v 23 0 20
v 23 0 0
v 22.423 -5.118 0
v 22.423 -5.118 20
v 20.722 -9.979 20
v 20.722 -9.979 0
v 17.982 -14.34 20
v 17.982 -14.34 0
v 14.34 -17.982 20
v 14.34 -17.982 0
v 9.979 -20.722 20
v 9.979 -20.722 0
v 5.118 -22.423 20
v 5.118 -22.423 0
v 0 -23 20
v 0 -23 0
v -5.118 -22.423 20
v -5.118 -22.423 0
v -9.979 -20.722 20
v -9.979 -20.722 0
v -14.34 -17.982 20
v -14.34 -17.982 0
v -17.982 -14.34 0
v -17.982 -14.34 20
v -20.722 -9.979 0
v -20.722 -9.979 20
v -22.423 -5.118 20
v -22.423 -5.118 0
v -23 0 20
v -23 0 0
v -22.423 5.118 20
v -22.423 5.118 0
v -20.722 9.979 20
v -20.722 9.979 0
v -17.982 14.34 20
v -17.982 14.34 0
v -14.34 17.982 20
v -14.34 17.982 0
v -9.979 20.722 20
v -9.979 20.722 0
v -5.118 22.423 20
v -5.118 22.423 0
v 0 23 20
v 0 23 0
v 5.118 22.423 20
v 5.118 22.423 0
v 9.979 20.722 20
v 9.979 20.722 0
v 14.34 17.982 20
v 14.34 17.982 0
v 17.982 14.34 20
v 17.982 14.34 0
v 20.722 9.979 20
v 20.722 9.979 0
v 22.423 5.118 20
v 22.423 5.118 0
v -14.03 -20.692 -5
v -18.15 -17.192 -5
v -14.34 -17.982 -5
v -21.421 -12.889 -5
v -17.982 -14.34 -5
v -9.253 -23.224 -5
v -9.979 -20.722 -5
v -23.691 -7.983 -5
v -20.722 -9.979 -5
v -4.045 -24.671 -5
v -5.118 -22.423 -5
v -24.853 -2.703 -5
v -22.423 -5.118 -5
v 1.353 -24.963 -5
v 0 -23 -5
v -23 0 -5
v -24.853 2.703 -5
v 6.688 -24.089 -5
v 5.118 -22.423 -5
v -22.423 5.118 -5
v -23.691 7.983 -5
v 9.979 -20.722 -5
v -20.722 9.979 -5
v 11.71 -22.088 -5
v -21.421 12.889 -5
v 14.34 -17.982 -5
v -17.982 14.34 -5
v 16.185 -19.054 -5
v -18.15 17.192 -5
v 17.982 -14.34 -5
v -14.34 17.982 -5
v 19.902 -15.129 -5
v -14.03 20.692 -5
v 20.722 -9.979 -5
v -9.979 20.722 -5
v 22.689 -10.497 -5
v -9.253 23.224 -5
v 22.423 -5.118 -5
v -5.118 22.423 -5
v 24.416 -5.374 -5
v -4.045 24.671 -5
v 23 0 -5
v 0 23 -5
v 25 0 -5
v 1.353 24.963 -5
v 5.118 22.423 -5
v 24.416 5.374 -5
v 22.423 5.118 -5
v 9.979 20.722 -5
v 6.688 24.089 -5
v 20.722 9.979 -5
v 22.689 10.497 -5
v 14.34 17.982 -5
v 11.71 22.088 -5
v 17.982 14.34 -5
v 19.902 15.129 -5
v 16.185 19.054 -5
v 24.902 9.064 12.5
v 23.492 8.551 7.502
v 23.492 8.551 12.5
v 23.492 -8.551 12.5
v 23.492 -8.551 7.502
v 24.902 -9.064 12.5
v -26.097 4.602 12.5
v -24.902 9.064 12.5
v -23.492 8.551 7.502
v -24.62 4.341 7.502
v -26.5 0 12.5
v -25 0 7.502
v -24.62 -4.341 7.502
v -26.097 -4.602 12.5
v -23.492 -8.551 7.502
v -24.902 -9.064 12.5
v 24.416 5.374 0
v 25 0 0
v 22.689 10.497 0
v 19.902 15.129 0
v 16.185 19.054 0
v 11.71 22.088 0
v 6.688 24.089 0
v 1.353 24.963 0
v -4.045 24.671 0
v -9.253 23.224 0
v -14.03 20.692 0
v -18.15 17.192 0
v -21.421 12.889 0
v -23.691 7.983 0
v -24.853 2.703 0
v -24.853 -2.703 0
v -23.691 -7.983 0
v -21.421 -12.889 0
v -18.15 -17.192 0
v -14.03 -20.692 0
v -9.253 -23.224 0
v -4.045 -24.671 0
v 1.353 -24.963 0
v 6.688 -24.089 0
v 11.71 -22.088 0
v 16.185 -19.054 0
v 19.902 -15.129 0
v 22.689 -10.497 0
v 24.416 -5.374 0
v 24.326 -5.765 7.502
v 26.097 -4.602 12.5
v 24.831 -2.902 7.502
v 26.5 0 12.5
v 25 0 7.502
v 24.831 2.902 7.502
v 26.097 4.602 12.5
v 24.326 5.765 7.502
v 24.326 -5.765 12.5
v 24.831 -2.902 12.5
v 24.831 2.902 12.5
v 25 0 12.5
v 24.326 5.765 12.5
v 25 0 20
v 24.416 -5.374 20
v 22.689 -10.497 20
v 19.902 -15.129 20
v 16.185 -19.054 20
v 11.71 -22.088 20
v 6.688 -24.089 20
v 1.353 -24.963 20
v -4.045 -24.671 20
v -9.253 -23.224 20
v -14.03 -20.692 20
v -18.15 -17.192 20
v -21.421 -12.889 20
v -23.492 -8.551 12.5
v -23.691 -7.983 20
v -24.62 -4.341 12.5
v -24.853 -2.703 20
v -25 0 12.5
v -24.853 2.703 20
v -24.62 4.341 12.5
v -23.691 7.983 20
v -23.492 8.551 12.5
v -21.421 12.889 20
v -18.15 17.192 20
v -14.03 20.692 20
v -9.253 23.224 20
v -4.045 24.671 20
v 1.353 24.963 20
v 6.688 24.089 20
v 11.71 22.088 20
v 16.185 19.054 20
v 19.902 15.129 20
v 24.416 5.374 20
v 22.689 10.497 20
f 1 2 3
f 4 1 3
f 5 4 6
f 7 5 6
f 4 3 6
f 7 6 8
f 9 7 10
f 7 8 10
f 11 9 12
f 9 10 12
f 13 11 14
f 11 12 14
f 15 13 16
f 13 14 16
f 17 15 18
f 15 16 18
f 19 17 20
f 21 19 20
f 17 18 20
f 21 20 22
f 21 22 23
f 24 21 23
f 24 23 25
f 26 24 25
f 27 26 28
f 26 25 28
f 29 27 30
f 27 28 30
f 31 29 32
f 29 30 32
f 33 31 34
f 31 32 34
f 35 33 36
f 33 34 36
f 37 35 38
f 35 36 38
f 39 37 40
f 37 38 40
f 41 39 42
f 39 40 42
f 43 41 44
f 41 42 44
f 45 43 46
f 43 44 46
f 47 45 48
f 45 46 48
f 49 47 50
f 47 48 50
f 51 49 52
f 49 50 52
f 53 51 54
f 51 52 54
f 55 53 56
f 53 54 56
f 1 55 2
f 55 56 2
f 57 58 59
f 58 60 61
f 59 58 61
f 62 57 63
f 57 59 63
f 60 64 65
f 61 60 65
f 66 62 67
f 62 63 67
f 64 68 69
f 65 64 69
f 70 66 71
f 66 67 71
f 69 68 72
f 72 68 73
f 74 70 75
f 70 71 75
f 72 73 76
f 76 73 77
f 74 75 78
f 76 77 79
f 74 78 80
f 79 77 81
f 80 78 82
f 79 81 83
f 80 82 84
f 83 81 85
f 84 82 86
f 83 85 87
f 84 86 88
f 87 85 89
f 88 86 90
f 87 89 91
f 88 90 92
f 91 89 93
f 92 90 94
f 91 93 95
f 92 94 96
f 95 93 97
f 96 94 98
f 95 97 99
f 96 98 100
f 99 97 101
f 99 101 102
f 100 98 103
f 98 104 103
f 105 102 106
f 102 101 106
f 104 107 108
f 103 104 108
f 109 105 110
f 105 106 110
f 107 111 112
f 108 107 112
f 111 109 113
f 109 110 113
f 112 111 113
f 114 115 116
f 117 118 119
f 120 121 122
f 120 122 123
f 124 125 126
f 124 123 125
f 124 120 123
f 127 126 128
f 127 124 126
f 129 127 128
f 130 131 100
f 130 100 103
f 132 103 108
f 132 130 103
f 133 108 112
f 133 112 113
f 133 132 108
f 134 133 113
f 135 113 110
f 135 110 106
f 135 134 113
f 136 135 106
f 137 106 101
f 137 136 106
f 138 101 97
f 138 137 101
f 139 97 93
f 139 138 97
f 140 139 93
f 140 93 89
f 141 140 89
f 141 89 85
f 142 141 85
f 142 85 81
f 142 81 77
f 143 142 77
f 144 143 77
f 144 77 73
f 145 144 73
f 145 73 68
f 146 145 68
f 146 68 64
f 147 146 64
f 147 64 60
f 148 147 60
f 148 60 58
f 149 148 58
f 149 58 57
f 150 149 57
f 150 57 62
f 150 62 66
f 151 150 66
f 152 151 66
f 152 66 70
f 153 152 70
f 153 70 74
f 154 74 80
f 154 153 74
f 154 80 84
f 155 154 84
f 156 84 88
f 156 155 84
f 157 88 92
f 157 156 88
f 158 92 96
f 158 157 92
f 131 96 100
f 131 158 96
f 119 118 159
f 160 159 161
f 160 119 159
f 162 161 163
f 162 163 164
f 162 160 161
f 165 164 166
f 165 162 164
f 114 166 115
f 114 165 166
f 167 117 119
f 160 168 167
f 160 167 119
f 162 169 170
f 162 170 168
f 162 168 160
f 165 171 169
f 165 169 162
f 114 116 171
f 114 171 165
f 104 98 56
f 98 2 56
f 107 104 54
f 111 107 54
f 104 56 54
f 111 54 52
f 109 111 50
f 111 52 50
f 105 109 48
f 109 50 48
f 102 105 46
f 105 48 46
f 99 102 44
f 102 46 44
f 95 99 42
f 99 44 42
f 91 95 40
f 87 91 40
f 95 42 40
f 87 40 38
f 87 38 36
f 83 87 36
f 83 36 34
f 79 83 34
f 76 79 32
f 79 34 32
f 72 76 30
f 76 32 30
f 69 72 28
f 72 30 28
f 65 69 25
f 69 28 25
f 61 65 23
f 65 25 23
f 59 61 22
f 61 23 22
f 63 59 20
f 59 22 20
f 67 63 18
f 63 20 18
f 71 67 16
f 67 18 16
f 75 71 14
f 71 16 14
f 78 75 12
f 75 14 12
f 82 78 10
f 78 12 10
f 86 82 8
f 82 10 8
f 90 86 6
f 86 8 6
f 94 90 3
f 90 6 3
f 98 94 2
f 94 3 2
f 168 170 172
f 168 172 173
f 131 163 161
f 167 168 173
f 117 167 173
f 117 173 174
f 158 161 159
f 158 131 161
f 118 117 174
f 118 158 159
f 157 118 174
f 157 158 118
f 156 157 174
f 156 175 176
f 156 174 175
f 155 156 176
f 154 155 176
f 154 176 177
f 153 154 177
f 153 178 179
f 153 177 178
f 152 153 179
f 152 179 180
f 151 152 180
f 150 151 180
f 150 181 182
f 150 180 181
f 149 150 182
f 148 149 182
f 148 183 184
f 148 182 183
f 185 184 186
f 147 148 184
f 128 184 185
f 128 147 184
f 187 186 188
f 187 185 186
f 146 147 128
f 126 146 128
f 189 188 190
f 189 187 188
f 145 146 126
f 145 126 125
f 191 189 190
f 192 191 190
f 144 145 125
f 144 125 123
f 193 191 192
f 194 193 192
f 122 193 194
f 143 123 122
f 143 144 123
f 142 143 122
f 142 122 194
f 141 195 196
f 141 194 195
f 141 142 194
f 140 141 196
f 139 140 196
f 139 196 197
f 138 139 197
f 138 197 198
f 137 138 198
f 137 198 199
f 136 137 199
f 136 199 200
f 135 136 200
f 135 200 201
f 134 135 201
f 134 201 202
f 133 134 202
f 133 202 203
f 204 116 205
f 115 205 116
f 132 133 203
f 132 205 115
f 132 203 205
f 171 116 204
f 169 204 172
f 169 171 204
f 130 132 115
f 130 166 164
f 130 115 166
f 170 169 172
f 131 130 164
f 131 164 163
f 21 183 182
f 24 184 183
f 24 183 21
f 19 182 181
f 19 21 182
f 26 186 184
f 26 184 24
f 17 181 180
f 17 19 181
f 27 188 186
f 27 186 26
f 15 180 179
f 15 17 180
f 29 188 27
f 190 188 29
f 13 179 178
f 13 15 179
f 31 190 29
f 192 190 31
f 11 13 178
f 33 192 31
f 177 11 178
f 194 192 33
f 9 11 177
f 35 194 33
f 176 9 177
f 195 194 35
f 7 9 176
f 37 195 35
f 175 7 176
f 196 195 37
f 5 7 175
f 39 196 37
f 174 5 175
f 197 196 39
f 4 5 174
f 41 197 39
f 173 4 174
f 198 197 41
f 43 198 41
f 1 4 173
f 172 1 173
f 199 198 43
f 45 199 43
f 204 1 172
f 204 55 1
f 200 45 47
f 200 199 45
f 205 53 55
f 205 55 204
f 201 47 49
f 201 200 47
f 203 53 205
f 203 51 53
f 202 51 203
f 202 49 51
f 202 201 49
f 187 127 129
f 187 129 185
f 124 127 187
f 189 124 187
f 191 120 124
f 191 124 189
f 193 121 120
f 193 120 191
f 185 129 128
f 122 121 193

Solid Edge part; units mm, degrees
sketch "Sketch1" plane through (0, 0, 0) normal (0, 0, 1) x (1, 0, 0)
  circle A0 centre (0, 0) radius 25
  circle A1 centre (0, 0) radius 23
  dimension "D1" = 2
extrude "Protrusion1" add sketch "Sketch1" along normal blind 25
sketch "Sketch2" plane through (0, 0, 0) normal (0, -1, 0) x (1, 0, 0)
  line L0 (26.5, 12.5) -> (25, 7.5023)
  line L1 (25, 7.5023) -> (25, 12.5)
  line L2 (25, 12.5) -> (26.5, 12.5)
revolve "RevolvedProtrusion_1" add sketch "Sketch2" angle 40 mid plane about axis through (0, 0, 0) along (0, 0, 1)
mirror "Mirror1" about plane through (0, 0, 0) normal (1, 0, 0) of "RevolvedProtrusion_1"
sketch "Sketch3" plane through (0, 0, 0) normal (0, 0, 1) x (1, 0, 0)
  circle A0 centre (0, 0) radius 25
  circle A1 centre (0, 0) radius 23
  dimension "D1" = 2
extrude "Protrusion2" add sketch "Sketch3" against normal blind 5
sketch "Sketch4" plane through (0, 0, 25) normal (0, 0, 1) x (1, 0, 0)
  circle A0 centre (0, 0) radius 25
extrude "ExtrudedCutout_1" cut sketch "Sketch4" against normal blind 5
